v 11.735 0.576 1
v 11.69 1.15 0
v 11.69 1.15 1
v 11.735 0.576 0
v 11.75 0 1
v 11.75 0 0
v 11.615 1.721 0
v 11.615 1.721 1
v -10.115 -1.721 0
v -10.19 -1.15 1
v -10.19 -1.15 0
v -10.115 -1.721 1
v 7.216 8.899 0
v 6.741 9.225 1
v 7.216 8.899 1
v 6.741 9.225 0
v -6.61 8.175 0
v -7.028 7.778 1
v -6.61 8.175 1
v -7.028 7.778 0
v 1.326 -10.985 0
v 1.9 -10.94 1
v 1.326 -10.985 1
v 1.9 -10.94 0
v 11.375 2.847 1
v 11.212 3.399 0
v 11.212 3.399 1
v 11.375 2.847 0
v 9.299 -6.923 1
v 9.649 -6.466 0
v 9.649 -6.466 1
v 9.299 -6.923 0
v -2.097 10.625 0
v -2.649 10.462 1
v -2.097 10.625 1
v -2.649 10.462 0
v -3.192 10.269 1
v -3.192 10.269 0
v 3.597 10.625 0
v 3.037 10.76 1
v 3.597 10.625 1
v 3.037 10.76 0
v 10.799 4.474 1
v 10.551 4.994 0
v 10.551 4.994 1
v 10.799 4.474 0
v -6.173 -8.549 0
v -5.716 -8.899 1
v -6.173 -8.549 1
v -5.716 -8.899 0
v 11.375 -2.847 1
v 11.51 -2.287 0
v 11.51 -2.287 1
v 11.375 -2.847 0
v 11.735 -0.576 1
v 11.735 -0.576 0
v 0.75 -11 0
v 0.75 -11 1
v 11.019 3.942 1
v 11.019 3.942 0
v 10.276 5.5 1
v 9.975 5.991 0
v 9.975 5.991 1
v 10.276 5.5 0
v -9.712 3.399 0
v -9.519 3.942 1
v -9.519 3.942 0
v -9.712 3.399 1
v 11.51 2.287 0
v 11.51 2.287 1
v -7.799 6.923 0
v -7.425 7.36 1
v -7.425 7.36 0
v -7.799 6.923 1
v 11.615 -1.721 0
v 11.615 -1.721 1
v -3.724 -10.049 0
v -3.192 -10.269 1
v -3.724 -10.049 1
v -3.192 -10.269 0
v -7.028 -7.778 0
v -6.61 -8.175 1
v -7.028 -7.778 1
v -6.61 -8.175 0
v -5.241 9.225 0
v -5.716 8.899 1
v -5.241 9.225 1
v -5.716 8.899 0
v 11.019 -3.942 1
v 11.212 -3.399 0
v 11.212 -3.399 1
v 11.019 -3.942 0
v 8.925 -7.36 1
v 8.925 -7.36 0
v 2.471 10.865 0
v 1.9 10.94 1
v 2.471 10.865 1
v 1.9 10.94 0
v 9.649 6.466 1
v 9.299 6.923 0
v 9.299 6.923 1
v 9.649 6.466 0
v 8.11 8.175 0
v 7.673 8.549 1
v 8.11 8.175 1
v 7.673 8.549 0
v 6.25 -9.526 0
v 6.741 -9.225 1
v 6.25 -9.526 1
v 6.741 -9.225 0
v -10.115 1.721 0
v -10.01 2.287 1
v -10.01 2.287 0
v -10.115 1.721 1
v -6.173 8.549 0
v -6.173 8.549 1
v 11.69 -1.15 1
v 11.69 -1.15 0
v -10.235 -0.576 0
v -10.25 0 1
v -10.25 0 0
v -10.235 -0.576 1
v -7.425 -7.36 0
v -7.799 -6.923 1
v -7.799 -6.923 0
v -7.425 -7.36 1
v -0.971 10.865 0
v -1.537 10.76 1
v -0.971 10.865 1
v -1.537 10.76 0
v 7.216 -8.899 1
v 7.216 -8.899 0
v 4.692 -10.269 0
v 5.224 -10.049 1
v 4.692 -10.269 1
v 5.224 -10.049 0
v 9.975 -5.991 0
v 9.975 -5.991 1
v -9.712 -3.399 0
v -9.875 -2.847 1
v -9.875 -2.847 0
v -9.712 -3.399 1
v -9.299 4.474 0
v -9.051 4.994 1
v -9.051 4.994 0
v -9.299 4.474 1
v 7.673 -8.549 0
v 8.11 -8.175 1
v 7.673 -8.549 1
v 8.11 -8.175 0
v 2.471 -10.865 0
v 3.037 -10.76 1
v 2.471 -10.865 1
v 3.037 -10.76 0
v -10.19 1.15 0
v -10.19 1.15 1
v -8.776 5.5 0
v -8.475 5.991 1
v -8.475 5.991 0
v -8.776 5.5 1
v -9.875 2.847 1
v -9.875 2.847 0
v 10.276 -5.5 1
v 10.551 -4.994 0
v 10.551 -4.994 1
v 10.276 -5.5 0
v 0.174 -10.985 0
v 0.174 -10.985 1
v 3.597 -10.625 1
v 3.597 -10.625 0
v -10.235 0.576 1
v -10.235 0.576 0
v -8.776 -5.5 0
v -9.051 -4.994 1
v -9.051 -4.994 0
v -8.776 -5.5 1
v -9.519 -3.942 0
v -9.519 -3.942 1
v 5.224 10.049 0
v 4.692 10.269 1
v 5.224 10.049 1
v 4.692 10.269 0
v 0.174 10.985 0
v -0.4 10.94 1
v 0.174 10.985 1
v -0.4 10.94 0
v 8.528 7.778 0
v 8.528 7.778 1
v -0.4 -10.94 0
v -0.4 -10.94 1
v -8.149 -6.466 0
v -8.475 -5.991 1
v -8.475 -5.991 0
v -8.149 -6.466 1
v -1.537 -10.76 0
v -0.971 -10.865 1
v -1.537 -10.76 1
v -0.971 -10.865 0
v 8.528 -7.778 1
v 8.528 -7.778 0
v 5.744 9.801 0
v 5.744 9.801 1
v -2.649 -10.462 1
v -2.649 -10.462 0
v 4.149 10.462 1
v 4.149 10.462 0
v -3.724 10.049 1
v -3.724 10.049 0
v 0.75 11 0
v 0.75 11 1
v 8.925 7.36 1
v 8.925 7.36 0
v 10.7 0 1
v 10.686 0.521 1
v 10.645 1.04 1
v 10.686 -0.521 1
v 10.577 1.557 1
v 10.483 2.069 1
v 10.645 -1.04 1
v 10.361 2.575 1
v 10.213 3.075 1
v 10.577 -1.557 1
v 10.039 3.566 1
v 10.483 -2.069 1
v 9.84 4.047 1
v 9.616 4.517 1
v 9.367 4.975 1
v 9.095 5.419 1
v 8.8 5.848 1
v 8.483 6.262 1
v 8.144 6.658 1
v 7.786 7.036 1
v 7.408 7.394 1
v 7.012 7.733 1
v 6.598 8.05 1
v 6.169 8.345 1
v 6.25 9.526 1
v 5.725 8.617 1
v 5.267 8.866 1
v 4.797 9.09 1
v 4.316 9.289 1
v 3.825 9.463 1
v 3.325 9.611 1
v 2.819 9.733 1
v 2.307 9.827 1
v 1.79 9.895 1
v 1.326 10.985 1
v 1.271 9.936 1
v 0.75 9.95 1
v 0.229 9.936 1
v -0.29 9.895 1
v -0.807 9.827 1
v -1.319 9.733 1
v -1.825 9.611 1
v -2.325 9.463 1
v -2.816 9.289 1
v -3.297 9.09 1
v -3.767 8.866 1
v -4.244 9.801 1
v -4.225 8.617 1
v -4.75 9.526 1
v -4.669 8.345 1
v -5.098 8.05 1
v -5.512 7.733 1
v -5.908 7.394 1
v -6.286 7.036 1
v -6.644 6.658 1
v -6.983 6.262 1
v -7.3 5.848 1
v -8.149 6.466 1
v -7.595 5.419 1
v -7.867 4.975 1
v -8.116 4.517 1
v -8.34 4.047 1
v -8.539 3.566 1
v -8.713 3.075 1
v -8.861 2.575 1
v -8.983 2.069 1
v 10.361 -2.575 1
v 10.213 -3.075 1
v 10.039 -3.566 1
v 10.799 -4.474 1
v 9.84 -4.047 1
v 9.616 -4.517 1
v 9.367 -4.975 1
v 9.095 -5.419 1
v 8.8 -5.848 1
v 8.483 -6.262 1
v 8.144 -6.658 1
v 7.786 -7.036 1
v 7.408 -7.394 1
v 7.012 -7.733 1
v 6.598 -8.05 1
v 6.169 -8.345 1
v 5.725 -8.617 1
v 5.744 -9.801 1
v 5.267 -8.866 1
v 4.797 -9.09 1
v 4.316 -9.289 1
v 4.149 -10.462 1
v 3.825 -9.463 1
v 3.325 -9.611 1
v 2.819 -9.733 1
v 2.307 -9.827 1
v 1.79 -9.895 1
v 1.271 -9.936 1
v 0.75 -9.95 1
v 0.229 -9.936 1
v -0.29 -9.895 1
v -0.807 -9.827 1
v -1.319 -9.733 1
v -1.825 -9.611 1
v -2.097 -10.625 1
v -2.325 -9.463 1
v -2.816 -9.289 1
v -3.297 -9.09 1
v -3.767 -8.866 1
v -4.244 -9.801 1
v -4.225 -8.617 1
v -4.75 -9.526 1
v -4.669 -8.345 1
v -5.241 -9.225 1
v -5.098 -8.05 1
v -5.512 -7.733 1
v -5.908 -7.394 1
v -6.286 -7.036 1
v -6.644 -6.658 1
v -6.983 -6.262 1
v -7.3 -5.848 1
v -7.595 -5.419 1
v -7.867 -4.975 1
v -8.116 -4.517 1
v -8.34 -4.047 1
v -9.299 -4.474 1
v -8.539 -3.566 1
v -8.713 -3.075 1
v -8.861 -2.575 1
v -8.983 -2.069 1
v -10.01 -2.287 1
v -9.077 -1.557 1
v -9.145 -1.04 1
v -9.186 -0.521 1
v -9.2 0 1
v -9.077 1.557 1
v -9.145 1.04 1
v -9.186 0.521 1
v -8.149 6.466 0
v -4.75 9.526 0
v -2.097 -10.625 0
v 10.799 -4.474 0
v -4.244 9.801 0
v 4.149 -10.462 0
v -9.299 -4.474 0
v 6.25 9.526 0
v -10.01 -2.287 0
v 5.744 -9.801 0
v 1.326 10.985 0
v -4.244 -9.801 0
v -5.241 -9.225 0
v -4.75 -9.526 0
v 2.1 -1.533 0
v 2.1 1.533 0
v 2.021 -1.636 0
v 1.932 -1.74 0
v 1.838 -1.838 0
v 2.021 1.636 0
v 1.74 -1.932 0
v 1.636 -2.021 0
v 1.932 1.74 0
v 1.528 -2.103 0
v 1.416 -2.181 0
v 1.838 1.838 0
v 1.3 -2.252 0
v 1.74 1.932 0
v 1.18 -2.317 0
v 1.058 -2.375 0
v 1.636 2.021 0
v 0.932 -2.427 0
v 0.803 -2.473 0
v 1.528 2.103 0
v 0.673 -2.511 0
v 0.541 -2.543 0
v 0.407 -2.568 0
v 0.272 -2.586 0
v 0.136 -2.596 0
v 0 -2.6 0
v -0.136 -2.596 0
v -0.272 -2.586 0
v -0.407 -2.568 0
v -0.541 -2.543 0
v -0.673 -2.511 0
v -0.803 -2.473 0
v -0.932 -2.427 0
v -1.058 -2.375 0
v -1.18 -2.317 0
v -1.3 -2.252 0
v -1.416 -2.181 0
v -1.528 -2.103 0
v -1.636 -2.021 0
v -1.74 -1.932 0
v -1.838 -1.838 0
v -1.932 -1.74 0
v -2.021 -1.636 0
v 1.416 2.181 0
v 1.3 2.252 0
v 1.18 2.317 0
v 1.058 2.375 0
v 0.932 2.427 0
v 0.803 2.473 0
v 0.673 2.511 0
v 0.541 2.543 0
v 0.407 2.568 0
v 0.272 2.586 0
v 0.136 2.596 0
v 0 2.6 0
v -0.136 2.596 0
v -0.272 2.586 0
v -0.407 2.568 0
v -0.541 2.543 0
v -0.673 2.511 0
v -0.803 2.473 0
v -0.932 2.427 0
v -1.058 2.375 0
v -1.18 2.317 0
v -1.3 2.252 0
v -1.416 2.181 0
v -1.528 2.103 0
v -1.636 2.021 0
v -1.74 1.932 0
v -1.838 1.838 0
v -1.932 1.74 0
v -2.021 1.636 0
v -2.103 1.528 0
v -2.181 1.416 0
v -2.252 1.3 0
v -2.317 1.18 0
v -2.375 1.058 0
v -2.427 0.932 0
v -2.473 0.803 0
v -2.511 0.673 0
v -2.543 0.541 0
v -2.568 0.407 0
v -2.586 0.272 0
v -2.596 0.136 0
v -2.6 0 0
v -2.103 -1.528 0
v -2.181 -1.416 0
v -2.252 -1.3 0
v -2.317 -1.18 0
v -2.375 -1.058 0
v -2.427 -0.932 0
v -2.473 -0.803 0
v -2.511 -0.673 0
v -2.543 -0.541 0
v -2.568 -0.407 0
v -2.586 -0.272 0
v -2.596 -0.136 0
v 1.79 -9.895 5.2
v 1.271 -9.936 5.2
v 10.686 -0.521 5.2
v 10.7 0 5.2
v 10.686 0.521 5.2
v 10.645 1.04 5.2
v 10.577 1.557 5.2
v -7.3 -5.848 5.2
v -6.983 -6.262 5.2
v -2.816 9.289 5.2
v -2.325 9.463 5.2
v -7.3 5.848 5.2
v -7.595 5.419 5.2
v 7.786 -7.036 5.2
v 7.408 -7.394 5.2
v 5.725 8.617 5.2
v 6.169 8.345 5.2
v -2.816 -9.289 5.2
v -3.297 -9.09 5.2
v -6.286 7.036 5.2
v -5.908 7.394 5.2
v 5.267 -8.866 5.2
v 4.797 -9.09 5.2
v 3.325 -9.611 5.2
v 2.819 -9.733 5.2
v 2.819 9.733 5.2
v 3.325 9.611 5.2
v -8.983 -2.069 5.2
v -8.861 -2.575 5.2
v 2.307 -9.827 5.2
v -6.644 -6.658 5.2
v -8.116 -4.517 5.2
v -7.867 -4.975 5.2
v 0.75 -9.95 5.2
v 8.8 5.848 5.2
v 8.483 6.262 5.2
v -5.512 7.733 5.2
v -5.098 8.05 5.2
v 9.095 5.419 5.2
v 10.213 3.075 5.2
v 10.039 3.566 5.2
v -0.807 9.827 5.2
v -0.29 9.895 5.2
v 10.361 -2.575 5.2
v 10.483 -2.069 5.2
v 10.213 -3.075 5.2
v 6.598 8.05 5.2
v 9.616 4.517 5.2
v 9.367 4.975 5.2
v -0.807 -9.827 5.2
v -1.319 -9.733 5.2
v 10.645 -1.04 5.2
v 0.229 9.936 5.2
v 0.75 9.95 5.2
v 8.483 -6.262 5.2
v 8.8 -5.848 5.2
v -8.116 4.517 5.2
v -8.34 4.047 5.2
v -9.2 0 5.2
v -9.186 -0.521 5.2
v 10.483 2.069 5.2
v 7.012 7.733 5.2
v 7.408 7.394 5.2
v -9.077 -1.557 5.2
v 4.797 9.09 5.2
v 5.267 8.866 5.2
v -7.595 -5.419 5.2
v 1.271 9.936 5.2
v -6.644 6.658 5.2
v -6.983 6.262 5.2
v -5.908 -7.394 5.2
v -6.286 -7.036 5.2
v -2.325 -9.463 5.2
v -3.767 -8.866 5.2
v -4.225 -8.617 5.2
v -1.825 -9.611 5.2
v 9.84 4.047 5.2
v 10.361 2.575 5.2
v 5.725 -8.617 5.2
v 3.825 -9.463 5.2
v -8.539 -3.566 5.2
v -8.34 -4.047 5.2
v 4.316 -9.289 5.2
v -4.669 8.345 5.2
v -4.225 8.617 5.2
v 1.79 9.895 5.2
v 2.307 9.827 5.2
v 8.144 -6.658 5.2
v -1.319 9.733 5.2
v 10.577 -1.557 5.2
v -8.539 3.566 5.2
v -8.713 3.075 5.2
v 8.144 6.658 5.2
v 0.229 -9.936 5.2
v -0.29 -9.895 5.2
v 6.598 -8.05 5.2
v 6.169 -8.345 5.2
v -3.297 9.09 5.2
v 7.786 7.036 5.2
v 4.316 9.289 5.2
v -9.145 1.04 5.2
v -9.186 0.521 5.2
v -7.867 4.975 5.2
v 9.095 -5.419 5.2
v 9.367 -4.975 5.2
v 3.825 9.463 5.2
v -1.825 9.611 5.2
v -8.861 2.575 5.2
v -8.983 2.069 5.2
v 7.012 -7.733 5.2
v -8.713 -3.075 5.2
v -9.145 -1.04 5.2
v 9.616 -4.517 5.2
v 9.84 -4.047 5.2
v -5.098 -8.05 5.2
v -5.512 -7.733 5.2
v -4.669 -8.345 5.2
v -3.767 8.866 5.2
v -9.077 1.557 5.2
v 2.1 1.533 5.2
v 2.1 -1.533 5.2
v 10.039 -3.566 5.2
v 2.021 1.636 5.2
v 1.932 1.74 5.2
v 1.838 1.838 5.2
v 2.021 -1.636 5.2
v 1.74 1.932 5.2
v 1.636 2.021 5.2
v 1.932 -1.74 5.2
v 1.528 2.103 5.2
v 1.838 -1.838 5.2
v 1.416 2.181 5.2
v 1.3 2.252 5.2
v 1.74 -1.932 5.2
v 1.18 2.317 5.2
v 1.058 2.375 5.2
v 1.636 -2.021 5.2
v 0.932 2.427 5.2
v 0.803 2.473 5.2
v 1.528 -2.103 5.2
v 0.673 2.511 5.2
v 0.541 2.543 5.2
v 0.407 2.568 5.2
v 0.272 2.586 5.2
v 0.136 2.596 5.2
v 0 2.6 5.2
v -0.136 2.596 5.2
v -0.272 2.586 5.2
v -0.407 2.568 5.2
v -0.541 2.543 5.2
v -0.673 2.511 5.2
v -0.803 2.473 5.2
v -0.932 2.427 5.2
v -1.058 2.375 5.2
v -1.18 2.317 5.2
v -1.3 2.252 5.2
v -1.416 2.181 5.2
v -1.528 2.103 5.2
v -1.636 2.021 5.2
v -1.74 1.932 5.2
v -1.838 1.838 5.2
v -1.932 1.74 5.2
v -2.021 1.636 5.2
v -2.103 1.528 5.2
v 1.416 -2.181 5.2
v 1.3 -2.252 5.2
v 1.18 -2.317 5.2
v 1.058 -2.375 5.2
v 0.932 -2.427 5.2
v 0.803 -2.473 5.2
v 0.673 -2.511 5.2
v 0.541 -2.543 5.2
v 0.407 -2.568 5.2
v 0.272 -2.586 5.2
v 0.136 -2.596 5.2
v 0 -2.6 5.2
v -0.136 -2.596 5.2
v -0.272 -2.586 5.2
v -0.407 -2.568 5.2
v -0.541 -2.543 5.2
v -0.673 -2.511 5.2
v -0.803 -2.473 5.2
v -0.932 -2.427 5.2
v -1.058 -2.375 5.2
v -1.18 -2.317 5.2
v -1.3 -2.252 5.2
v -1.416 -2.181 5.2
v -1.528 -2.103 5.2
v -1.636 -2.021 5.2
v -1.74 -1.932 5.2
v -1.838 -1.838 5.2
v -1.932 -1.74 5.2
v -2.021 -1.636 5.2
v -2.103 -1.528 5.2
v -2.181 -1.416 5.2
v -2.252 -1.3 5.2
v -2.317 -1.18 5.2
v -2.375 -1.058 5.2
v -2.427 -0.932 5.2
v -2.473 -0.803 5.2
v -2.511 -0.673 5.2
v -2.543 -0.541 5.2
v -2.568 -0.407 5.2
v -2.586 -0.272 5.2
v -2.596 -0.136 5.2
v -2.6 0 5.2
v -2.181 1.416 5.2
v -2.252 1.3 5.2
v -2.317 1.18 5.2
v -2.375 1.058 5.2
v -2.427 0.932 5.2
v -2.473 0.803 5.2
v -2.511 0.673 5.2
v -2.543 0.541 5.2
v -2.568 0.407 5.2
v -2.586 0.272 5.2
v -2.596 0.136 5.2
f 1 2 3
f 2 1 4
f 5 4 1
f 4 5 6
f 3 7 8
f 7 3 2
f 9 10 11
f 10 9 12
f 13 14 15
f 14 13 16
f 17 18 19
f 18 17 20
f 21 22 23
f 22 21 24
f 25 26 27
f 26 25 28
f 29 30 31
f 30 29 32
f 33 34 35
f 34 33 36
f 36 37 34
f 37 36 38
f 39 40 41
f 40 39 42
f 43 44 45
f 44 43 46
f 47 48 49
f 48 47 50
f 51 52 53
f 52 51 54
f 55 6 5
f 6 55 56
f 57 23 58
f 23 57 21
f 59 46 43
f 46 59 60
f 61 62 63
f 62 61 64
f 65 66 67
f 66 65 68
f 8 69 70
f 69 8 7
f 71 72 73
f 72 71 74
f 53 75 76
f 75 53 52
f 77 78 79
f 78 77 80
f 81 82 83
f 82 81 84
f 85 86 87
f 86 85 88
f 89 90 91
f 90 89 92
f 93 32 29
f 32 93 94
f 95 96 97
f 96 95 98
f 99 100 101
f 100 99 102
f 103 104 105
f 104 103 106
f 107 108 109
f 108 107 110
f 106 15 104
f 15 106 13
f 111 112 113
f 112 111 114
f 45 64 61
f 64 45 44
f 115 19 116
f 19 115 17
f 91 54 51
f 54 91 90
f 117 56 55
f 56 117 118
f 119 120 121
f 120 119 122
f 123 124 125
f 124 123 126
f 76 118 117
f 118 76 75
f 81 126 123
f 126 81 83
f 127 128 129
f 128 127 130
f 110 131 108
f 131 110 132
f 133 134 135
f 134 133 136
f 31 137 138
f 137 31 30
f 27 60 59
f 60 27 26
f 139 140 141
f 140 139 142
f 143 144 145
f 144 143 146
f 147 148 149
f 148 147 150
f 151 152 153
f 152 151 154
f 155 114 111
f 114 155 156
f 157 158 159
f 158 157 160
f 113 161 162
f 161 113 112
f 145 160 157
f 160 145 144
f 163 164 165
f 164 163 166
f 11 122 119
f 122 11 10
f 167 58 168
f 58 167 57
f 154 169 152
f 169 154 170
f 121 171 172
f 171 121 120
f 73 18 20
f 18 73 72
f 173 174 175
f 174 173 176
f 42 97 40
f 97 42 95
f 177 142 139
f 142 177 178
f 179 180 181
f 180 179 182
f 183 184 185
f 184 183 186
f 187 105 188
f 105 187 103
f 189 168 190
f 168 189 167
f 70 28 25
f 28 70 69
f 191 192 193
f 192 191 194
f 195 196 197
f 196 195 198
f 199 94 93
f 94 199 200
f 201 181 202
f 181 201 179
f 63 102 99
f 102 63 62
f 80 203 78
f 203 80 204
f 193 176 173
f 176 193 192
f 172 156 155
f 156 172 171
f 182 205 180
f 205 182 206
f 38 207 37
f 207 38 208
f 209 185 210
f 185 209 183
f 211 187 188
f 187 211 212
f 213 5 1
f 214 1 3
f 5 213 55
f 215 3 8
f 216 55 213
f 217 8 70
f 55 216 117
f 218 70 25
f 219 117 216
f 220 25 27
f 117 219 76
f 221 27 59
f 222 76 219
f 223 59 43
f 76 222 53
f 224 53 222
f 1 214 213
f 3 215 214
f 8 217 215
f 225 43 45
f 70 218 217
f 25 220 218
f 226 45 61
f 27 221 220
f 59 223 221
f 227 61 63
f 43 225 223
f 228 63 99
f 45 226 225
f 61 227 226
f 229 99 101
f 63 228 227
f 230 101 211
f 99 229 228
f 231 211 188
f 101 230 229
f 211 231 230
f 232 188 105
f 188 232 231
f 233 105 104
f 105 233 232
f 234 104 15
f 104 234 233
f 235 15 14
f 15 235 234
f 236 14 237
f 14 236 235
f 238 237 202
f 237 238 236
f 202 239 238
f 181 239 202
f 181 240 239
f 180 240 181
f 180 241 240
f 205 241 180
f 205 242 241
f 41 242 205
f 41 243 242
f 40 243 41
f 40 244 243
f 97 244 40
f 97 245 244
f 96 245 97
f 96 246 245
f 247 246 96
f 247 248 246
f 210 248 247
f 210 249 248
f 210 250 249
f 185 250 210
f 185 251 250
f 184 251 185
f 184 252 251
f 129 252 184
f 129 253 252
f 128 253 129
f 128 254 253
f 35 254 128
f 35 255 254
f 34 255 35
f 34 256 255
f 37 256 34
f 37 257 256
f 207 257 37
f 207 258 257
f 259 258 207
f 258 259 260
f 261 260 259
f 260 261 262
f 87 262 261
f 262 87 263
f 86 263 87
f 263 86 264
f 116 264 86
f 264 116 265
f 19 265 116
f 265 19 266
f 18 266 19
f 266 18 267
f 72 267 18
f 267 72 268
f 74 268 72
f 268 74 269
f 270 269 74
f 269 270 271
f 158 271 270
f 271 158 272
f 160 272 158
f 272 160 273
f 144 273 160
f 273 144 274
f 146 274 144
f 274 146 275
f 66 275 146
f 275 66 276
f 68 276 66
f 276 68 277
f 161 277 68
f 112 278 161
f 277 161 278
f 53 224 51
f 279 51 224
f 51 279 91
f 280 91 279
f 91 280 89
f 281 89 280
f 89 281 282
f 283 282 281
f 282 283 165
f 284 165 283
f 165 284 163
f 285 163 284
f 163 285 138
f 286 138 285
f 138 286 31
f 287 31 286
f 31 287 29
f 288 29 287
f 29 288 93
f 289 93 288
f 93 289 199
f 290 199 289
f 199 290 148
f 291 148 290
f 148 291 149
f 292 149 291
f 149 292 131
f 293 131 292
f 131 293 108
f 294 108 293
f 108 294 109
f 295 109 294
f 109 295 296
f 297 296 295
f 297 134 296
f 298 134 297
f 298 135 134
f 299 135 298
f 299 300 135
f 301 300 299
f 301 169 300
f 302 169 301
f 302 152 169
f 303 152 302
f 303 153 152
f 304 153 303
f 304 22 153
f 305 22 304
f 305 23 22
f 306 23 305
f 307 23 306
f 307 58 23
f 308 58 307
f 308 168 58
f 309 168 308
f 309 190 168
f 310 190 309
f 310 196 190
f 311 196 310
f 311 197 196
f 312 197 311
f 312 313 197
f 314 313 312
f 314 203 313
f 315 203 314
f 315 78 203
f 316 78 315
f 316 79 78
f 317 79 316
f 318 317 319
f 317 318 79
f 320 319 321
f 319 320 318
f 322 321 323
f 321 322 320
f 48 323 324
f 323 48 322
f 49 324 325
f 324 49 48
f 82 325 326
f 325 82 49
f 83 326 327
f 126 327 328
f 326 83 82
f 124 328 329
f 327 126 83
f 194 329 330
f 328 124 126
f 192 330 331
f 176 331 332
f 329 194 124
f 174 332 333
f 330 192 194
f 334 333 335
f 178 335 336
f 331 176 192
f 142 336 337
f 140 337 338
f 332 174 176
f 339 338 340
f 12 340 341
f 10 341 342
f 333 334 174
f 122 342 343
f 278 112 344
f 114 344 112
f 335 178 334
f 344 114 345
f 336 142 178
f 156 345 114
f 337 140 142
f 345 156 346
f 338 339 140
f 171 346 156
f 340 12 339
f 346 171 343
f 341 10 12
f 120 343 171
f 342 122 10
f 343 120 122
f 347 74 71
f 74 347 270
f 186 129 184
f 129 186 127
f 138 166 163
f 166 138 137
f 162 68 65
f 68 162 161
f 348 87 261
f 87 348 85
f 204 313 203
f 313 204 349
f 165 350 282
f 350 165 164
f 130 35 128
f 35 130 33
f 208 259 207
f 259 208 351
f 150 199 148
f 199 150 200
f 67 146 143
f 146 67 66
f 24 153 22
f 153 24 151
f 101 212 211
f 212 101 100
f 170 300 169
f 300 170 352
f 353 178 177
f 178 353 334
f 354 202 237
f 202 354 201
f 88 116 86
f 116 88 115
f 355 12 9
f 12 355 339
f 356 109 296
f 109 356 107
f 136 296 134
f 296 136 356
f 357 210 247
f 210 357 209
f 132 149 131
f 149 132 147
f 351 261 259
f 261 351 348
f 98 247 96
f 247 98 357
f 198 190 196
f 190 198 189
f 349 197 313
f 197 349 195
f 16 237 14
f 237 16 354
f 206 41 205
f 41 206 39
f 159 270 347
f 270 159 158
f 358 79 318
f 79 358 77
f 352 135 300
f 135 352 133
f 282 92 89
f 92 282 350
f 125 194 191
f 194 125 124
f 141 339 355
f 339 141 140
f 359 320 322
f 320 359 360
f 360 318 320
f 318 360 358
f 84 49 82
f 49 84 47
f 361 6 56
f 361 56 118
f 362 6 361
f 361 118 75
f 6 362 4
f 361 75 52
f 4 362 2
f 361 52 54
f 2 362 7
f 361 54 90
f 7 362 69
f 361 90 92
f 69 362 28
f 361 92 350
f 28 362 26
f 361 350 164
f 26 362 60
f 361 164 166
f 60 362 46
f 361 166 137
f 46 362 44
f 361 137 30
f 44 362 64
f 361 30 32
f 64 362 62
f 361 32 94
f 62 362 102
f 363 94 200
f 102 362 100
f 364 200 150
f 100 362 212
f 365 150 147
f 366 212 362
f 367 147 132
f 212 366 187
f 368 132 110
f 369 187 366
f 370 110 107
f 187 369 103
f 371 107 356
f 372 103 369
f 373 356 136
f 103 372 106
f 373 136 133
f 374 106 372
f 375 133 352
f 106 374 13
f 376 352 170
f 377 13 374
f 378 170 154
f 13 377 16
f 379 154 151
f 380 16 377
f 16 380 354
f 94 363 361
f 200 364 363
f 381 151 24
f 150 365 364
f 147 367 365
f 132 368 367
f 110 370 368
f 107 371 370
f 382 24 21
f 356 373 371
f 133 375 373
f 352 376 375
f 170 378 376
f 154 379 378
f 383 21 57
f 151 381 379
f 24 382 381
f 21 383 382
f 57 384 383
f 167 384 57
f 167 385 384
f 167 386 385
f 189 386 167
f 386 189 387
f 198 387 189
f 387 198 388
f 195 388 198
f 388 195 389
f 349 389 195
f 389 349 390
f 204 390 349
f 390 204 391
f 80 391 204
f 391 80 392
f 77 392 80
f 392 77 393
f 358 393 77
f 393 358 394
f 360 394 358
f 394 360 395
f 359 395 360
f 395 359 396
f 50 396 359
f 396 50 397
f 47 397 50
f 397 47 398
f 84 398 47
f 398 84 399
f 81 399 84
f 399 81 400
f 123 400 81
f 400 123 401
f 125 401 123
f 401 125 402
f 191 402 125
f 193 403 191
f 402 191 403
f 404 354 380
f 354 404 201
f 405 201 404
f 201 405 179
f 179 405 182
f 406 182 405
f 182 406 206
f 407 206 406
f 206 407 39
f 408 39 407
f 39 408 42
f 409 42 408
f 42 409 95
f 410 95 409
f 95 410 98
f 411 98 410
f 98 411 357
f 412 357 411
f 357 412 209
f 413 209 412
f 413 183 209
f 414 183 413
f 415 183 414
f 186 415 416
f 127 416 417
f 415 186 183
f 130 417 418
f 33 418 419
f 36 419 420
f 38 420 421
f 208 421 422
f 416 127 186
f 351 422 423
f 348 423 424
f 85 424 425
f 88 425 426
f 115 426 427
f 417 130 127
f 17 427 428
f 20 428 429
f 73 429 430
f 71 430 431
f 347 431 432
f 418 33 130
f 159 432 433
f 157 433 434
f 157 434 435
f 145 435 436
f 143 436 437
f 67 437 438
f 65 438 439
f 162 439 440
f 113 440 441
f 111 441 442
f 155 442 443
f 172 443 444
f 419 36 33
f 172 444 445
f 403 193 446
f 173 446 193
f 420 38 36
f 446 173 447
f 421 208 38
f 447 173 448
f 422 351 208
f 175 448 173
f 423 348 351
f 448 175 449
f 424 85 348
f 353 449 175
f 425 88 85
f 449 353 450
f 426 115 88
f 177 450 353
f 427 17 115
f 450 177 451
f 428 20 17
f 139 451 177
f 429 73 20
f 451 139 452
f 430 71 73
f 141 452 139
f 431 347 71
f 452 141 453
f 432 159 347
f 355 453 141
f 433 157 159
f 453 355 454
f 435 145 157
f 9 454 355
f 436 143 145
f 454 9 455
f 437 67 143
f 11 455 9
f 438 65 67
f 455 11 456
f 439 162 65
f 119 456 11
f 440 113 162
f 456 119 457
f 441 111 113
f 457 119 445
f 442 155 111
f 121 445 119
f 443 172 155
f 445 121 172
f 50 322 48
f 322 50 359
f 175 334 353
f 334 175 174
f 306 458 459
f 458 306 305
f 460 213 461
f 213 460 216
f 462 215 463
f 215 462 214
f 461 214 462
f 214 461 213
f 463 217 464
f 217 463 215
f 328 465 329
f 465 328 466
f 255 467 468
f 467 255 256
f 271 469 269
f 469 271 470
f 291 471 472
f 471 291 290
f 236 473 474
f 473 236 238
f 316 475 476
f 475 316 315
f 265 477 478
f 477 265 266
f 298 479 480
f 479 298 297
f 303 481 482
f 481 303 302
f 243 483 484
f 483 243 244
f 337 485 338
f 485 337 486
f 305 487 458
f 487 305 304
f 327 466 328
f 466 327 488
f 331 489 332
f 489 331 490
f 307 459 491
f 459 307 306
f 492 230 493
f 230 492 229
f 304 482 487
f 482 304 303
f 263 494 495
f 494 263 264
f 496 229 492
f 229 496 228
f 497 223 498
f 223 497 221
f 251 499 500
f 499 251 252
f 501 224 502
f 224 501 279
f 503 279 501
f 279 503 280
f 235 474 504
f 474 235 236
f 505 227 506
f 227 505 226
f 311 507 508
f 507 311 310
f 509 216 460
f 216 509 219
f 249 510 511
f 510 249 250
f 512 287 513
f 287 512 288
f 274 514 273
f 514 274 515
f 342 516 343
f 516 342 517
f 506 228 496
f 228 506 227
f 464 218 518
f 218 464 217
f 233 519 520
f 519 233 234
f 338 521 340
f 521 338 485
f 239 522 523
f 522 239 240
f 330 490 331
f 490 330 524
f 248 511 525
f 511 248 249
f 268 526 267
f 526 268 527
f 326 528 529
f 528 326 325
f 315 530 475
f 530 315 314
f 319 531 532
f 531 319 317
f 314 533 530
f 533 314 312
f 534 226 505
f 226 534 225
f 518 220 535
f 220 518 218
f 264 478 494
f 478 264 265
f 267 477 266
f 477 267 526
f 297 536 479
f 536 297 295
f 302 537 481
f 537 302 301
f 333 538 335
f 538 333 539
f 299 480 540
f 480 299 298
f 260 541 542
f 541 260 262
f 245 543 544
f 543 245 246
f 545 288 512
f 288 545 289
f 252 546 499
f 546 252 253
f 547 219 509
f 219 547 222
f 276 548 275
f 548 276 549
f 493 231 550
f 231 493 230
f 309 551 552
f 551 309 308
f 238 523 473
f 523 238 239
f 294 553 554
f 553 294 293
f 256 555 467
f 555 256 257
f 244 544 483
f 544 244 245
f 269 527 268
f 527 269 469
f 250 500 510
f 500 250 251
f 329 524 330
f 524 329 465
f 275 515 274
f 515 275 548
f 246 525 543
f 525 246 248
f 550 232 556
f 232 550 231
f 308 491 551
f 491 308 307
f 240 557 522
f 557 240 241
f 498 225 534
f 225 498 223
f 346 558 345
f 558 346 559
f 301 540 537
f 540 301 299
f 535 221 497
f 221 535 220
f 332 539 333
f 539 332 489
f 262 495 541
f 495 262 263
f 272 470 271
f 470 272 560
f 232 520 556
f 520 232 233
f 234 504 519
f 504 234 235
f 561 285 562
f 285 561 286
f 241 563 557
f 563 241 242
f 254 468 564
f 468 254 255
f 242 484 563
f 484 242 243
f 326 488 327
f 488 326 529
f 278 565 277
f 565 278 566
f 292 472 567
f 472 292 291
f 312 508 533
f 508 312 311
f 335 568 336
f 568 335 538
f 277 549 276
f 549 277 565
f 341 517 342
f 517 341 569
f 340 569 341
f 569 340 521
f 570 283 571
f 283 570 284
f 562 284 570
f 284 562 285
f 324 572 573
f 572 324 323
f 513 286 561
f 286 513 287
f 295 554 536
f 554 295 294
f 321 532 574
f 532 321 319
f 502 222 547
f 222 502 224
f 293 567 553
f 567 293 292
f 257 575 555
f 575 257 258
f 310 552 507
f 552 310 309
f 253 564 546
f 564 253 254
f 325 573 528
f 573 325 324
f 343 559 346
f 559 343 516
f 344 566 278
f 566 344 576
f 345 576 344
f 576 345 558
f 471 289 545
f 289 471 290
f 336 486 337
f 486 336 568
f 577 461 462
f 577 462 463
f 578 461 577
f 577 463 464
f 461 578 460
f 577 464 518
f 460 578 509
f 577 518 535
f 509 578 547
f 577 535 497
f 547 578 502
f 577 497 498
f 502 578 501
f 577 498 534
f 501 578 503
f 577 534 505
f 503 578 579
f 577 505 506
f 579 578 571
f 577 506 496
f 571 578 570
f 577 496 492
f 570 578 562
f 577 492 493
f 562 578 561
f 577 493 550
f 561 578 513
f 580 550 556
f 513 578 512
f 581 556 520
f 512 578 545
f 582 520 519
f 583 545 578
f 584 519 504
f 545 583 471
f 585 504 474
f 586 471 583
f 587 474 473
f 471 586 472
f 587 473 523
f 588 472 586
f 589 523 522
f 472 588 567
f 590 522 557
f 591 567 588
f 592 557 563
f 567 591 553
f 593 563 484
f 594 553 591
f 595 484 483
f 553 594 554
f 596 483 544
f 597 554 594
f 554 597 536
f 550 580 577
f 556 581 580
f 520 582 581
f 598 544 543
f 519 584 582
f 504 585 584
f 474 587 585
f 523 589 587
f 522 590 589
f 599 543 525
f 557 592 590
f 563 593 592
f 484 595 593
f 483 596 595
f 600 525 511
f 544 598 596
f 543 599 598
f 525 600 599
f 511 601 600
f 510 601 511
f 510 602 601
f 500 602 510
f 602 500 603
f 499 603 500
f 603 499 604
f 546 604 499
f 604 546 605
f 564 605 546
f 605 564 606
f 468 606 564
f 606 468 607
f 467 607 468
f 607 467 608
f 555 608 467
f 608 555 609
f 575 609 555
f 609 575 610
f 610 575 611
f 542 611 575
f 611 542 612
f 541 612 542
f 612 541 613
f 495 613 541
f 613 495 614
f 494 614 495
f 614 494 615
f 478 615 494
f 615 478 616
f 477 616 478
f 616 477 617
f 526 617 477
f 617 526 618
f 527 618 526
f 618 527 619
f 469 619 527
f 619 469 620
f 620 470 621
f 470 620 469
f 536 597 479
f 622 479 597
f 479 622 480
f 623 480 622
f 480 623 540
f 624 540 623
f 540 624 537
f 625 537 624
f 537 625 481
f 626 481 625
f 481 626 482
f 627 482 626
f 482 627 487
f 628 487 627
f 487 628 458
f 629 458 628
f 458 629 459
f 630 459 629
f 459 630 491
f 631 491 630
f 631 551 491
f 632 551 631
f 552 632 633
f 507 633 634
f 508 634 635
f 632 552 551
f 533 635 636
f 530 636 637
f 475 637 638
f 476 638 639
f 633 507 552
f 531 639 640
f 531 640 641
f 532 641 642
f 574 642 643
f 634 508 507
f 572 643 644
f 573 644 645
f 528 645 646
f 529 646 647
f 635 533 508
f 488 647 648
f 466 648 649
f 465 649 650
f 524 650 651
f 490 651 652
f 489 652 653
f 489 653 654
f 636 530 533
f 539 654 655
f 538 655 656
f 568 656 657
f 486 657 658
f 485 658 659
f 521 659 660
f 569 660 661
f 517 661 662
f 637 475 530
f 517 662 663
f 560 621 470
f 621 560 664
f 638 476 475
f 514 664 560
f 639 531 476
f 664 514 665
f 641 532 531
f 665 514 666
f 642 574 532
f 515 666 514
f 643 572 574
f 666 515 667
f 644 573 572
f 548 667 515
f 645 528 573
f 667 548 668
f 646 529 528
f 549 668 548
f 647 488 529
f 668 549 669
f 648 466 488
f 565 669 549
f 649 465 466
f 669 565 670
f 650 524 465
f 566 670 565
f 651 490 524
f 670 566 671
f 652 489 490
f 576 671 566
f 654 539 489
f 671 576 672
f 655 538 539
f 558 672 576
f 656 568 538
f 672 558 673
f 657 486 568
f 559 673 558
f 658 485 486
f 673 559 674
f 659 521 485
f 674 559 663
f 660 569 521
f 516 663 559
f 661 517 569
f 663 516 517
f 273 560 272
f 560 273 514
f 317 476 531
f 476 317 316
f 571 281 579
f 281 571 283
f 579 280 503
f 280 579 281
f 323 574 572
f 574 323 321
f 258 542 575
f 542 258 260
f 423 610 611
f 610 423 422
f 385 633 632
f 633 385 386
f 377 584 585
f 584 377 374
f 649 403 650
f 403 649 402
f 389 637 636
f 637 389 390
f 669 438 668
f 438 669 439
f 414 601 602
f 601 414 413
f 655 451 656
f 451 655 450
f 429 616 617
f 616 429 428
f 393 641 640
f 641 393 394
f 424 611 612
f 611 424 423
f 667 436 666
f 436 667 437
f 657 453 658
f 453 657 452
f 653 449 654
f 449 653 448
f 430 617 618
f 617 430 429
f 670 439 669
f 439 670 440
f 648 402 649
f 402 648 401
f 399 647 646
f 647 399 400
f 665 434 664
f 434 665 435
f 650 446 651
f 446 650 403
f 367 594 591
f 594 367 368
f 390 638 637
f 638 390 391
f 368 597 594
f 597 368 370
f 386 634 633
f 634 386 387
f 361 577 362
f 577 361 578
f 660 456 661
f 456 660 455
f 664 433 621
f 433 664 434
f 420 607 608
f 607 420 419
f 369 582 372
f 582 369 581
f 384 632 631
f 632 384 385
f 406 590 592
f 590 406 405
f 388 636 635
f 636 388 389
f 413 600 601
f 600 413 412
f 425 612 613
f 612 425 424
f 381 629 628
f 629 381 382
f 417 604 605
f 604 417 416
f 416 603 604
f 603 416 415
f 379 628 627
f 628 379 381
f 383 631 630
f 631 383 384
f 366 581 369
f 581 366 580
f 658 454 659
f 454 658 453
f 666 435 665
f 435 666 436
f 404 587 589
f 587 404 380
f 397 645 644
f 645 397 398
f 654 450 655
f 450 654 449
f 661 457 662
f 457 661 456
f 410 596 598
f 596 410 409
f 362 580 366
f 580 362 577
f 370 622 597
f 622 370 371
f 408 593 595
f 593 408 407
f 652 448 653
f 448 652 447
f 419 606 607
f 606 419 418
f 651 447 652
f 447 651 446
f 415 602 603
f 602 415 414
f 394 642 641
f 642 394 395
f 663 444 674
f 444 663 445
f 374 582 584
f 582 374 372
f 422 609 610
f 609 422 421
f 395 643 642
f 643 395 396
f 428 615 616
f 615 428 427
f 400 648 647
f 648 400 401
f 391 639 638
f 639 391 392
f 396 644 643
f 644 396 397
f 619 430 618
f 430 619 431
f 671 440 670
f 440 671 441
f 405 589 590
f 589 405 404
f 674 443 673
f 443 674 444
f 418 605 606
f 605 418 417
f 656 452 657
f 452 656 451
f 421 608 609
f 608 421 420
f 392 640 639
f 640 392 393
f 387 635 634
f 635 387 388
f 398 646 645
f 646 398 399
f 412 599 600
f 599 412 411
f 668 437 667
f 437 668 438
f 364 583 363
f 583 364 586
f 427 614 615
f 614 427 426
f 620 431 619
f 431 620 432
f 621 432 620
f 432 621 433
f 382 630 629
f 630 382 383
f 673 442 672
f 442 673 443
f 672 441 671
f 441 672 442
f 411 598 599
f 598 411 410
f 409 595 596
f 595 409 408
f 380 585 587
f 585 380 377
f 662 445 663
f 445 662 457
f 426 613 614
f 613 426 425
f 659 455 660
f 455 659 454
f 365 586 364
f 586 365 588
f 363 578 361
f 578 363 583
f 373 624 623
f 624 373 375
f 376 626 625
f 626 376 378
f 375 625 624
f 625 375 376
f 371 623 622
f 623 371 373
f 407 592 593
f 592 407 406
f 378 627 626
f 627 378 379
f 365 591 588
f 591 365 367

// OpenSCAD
// file: oobb_hardware.scad
// Generated from installed OOBB v5. All primitives use overhang=True.

module oobb_hole_m2() {
difference() {
	union() {
		cylinder(h = 1, r = 1.35);
	}
	union();
}

}

module oobb_hole_m3() {
difference() {
	union() {
		cylinder(h = 1, r = 1.8);
	}
	union();
}

}

module oobb_hole_m6() {
difference() {
	union() {
		cylinder(h = 1, r = 3.25);
	}
	union();
}

}

module oobb_nut_m2() {
difference() {
	union() {
		translate(v = [0, 0, 0]) {
			rotate(a = [0, 0, 0]) {
				difference() {
					union() {
						linear_extrude(height = 2.2) {
							polygon(points = [[2.4234, 0.0], [1.2117000000000002, 2.0987259635312085], [-1.2116999999999996, 2.0987259635312085], [-2.4234, 2.967809053053696e-16], [-1.211700000000001, -2.098725963531208], [1.2116999999999984, -2.0987259635312094]]);
						}
						translate(v = [-1.25, -2.75, -0.3]) {
							cube(size = [2.5, 5.5, 0.3]);
						}
						translate(v = [-1.25, -1.25, -0.6]) {
							cube(size = [2.5, 2.5, 0.3]);
						}
						translate(v = [-1.25, -2.75, 2.2]) {
							cube(size = [2.5, 5.5, 0.3]);
						}
						translate(v = [-1.25, -1.25, 2.5]) {
							cube(size = [2.5, 2.5, 0.3]);
						}
					}
					union();
				}
			}
		}
	}
	union();
}

}

module oobb_socket_m2() {
difference() {
	union() {
		translate(v = [0, 0, 0]) {
			rotate(a = [0, 0, 0]) {
				difference() {
					union() {
						cylinder(h = 2.2, r = 2.1);
						translate(v = [-1.25, -2.75, -0.3]) {
							cube(size = [2.5, 5.5, 0.3]);
						}
						translate(v = [-1.25, -1.25, -0.6]) {
							cube(size = [2.5, 2.5, 0.3]);
						}
					}
					union();
				}
			}
		}
	}
	union();
}

}

module oobb_nut_m3() {
difference() {
	union() {
		translate(v = [0, 0, 0]) {
			rotate(a = [0, 0, 0]) {
				difference() {
					union() {
						linear_extrude(height = 2.7) {
							polygon(points = [[3.4619999999999997, 0.0], [1.7310000000000003, 2.9981799479017264], [-1.7309999999999992, 2.9981799479017264], [-3.4619999999999997, 4.2397272186481365e-16], [-1.7310000000000014, -2.998179947901726], [1.7309999999999977, -2.9981799479017277]]);
						}
						translate(v = [-1.75, -3.25, -0.3]) {
							cube(size = [3.5, 6.5, 0.3]);
						}
						translate(v = [-1.75, -1.75, -0.6]) {
							cube(size = [3.5, 3.5, 0.3]);
						}
						translate(v = [-1.75, -3.25, 2.7]) {
							cube(size = [3.5, 6.5, 0.3]);
						}
						translate(v = [-1.75, -1.75, 3.0]) {
							cube(size = [3.5, 3.5, 0.3]);
						}
					}
					union();
				}
			}
		}
	}
	union();
}

}

module oobb_socket_m3() {
difference() {
	union() {
		translate(v = [0, 0, 0]) {
			rotate(a = [0, 0, 0]) {
				difference() {
					union() {
						cylinder(h = 3.2, r = 3.0);
						translate(v = [-1.75, -3.25, -0.3]) {
							cube(size = [3.5, 6.5, 0.3]);
						}
						translate(v = [-1.75, -1.75, -0.6]) {
							cube(size = [3.5, 3.5, 0.3]);
						}
					}
					union();
				}
			}
		}
	}
	union();
}

}
// file: parameters.scad
// Generated by working_scad.py. Edit the Python recipe to persist changes.
style = "version_5";
reduction = 20;
bearing_output = "6810";
bearing_input = "6704";
bearing_wave = "6704";
roller_diameter = 7.0;
roller_bore_diameter = 3.2;
roller_length = 12.0;
roller_material = "nylon";
central_joint_depth = 6.0;
max_screw_length = 35.0;
eccentricity = 0.75;
wave_radius = 40.0;
profile_clearance = 0.15;
roller_slot_clearance = 0.3;
roller_end_clearance = 0.3;
cage_wall = 4.0;
cage_plate_depth = 3.0;
bearing_seat_clearance = 0.1;
journal_clearance = 0.05;
bearing_axial_clearance = 0.2;
retainer_depth = 4.0;
housing_radius = 57.5;
housing_flange_width = 119.0;
housing_flange_depth = 3.0;
housing_flange_corner_radius = 1.5;
housing_screw_pitch_radius = 53.0;
housing_screw_count = 8;
input_shaft_diameter = 5.0;
input_shaft_flat_depth = 0.5;
shaft_fit_clearance = 0.1;
cage_screw_count = 5;
cage_screw_pilot_diameter = 1.6;
profile_samples_per_cavity = 100;
circle_fragments = 120;
overhang = true;
run_scad = true;
run_solidcraft = false;
// main file
include <parameters.scad>;
use <oobb_hardware.scad>;
include <geometry.scad>;
eccentric_cam(false);
